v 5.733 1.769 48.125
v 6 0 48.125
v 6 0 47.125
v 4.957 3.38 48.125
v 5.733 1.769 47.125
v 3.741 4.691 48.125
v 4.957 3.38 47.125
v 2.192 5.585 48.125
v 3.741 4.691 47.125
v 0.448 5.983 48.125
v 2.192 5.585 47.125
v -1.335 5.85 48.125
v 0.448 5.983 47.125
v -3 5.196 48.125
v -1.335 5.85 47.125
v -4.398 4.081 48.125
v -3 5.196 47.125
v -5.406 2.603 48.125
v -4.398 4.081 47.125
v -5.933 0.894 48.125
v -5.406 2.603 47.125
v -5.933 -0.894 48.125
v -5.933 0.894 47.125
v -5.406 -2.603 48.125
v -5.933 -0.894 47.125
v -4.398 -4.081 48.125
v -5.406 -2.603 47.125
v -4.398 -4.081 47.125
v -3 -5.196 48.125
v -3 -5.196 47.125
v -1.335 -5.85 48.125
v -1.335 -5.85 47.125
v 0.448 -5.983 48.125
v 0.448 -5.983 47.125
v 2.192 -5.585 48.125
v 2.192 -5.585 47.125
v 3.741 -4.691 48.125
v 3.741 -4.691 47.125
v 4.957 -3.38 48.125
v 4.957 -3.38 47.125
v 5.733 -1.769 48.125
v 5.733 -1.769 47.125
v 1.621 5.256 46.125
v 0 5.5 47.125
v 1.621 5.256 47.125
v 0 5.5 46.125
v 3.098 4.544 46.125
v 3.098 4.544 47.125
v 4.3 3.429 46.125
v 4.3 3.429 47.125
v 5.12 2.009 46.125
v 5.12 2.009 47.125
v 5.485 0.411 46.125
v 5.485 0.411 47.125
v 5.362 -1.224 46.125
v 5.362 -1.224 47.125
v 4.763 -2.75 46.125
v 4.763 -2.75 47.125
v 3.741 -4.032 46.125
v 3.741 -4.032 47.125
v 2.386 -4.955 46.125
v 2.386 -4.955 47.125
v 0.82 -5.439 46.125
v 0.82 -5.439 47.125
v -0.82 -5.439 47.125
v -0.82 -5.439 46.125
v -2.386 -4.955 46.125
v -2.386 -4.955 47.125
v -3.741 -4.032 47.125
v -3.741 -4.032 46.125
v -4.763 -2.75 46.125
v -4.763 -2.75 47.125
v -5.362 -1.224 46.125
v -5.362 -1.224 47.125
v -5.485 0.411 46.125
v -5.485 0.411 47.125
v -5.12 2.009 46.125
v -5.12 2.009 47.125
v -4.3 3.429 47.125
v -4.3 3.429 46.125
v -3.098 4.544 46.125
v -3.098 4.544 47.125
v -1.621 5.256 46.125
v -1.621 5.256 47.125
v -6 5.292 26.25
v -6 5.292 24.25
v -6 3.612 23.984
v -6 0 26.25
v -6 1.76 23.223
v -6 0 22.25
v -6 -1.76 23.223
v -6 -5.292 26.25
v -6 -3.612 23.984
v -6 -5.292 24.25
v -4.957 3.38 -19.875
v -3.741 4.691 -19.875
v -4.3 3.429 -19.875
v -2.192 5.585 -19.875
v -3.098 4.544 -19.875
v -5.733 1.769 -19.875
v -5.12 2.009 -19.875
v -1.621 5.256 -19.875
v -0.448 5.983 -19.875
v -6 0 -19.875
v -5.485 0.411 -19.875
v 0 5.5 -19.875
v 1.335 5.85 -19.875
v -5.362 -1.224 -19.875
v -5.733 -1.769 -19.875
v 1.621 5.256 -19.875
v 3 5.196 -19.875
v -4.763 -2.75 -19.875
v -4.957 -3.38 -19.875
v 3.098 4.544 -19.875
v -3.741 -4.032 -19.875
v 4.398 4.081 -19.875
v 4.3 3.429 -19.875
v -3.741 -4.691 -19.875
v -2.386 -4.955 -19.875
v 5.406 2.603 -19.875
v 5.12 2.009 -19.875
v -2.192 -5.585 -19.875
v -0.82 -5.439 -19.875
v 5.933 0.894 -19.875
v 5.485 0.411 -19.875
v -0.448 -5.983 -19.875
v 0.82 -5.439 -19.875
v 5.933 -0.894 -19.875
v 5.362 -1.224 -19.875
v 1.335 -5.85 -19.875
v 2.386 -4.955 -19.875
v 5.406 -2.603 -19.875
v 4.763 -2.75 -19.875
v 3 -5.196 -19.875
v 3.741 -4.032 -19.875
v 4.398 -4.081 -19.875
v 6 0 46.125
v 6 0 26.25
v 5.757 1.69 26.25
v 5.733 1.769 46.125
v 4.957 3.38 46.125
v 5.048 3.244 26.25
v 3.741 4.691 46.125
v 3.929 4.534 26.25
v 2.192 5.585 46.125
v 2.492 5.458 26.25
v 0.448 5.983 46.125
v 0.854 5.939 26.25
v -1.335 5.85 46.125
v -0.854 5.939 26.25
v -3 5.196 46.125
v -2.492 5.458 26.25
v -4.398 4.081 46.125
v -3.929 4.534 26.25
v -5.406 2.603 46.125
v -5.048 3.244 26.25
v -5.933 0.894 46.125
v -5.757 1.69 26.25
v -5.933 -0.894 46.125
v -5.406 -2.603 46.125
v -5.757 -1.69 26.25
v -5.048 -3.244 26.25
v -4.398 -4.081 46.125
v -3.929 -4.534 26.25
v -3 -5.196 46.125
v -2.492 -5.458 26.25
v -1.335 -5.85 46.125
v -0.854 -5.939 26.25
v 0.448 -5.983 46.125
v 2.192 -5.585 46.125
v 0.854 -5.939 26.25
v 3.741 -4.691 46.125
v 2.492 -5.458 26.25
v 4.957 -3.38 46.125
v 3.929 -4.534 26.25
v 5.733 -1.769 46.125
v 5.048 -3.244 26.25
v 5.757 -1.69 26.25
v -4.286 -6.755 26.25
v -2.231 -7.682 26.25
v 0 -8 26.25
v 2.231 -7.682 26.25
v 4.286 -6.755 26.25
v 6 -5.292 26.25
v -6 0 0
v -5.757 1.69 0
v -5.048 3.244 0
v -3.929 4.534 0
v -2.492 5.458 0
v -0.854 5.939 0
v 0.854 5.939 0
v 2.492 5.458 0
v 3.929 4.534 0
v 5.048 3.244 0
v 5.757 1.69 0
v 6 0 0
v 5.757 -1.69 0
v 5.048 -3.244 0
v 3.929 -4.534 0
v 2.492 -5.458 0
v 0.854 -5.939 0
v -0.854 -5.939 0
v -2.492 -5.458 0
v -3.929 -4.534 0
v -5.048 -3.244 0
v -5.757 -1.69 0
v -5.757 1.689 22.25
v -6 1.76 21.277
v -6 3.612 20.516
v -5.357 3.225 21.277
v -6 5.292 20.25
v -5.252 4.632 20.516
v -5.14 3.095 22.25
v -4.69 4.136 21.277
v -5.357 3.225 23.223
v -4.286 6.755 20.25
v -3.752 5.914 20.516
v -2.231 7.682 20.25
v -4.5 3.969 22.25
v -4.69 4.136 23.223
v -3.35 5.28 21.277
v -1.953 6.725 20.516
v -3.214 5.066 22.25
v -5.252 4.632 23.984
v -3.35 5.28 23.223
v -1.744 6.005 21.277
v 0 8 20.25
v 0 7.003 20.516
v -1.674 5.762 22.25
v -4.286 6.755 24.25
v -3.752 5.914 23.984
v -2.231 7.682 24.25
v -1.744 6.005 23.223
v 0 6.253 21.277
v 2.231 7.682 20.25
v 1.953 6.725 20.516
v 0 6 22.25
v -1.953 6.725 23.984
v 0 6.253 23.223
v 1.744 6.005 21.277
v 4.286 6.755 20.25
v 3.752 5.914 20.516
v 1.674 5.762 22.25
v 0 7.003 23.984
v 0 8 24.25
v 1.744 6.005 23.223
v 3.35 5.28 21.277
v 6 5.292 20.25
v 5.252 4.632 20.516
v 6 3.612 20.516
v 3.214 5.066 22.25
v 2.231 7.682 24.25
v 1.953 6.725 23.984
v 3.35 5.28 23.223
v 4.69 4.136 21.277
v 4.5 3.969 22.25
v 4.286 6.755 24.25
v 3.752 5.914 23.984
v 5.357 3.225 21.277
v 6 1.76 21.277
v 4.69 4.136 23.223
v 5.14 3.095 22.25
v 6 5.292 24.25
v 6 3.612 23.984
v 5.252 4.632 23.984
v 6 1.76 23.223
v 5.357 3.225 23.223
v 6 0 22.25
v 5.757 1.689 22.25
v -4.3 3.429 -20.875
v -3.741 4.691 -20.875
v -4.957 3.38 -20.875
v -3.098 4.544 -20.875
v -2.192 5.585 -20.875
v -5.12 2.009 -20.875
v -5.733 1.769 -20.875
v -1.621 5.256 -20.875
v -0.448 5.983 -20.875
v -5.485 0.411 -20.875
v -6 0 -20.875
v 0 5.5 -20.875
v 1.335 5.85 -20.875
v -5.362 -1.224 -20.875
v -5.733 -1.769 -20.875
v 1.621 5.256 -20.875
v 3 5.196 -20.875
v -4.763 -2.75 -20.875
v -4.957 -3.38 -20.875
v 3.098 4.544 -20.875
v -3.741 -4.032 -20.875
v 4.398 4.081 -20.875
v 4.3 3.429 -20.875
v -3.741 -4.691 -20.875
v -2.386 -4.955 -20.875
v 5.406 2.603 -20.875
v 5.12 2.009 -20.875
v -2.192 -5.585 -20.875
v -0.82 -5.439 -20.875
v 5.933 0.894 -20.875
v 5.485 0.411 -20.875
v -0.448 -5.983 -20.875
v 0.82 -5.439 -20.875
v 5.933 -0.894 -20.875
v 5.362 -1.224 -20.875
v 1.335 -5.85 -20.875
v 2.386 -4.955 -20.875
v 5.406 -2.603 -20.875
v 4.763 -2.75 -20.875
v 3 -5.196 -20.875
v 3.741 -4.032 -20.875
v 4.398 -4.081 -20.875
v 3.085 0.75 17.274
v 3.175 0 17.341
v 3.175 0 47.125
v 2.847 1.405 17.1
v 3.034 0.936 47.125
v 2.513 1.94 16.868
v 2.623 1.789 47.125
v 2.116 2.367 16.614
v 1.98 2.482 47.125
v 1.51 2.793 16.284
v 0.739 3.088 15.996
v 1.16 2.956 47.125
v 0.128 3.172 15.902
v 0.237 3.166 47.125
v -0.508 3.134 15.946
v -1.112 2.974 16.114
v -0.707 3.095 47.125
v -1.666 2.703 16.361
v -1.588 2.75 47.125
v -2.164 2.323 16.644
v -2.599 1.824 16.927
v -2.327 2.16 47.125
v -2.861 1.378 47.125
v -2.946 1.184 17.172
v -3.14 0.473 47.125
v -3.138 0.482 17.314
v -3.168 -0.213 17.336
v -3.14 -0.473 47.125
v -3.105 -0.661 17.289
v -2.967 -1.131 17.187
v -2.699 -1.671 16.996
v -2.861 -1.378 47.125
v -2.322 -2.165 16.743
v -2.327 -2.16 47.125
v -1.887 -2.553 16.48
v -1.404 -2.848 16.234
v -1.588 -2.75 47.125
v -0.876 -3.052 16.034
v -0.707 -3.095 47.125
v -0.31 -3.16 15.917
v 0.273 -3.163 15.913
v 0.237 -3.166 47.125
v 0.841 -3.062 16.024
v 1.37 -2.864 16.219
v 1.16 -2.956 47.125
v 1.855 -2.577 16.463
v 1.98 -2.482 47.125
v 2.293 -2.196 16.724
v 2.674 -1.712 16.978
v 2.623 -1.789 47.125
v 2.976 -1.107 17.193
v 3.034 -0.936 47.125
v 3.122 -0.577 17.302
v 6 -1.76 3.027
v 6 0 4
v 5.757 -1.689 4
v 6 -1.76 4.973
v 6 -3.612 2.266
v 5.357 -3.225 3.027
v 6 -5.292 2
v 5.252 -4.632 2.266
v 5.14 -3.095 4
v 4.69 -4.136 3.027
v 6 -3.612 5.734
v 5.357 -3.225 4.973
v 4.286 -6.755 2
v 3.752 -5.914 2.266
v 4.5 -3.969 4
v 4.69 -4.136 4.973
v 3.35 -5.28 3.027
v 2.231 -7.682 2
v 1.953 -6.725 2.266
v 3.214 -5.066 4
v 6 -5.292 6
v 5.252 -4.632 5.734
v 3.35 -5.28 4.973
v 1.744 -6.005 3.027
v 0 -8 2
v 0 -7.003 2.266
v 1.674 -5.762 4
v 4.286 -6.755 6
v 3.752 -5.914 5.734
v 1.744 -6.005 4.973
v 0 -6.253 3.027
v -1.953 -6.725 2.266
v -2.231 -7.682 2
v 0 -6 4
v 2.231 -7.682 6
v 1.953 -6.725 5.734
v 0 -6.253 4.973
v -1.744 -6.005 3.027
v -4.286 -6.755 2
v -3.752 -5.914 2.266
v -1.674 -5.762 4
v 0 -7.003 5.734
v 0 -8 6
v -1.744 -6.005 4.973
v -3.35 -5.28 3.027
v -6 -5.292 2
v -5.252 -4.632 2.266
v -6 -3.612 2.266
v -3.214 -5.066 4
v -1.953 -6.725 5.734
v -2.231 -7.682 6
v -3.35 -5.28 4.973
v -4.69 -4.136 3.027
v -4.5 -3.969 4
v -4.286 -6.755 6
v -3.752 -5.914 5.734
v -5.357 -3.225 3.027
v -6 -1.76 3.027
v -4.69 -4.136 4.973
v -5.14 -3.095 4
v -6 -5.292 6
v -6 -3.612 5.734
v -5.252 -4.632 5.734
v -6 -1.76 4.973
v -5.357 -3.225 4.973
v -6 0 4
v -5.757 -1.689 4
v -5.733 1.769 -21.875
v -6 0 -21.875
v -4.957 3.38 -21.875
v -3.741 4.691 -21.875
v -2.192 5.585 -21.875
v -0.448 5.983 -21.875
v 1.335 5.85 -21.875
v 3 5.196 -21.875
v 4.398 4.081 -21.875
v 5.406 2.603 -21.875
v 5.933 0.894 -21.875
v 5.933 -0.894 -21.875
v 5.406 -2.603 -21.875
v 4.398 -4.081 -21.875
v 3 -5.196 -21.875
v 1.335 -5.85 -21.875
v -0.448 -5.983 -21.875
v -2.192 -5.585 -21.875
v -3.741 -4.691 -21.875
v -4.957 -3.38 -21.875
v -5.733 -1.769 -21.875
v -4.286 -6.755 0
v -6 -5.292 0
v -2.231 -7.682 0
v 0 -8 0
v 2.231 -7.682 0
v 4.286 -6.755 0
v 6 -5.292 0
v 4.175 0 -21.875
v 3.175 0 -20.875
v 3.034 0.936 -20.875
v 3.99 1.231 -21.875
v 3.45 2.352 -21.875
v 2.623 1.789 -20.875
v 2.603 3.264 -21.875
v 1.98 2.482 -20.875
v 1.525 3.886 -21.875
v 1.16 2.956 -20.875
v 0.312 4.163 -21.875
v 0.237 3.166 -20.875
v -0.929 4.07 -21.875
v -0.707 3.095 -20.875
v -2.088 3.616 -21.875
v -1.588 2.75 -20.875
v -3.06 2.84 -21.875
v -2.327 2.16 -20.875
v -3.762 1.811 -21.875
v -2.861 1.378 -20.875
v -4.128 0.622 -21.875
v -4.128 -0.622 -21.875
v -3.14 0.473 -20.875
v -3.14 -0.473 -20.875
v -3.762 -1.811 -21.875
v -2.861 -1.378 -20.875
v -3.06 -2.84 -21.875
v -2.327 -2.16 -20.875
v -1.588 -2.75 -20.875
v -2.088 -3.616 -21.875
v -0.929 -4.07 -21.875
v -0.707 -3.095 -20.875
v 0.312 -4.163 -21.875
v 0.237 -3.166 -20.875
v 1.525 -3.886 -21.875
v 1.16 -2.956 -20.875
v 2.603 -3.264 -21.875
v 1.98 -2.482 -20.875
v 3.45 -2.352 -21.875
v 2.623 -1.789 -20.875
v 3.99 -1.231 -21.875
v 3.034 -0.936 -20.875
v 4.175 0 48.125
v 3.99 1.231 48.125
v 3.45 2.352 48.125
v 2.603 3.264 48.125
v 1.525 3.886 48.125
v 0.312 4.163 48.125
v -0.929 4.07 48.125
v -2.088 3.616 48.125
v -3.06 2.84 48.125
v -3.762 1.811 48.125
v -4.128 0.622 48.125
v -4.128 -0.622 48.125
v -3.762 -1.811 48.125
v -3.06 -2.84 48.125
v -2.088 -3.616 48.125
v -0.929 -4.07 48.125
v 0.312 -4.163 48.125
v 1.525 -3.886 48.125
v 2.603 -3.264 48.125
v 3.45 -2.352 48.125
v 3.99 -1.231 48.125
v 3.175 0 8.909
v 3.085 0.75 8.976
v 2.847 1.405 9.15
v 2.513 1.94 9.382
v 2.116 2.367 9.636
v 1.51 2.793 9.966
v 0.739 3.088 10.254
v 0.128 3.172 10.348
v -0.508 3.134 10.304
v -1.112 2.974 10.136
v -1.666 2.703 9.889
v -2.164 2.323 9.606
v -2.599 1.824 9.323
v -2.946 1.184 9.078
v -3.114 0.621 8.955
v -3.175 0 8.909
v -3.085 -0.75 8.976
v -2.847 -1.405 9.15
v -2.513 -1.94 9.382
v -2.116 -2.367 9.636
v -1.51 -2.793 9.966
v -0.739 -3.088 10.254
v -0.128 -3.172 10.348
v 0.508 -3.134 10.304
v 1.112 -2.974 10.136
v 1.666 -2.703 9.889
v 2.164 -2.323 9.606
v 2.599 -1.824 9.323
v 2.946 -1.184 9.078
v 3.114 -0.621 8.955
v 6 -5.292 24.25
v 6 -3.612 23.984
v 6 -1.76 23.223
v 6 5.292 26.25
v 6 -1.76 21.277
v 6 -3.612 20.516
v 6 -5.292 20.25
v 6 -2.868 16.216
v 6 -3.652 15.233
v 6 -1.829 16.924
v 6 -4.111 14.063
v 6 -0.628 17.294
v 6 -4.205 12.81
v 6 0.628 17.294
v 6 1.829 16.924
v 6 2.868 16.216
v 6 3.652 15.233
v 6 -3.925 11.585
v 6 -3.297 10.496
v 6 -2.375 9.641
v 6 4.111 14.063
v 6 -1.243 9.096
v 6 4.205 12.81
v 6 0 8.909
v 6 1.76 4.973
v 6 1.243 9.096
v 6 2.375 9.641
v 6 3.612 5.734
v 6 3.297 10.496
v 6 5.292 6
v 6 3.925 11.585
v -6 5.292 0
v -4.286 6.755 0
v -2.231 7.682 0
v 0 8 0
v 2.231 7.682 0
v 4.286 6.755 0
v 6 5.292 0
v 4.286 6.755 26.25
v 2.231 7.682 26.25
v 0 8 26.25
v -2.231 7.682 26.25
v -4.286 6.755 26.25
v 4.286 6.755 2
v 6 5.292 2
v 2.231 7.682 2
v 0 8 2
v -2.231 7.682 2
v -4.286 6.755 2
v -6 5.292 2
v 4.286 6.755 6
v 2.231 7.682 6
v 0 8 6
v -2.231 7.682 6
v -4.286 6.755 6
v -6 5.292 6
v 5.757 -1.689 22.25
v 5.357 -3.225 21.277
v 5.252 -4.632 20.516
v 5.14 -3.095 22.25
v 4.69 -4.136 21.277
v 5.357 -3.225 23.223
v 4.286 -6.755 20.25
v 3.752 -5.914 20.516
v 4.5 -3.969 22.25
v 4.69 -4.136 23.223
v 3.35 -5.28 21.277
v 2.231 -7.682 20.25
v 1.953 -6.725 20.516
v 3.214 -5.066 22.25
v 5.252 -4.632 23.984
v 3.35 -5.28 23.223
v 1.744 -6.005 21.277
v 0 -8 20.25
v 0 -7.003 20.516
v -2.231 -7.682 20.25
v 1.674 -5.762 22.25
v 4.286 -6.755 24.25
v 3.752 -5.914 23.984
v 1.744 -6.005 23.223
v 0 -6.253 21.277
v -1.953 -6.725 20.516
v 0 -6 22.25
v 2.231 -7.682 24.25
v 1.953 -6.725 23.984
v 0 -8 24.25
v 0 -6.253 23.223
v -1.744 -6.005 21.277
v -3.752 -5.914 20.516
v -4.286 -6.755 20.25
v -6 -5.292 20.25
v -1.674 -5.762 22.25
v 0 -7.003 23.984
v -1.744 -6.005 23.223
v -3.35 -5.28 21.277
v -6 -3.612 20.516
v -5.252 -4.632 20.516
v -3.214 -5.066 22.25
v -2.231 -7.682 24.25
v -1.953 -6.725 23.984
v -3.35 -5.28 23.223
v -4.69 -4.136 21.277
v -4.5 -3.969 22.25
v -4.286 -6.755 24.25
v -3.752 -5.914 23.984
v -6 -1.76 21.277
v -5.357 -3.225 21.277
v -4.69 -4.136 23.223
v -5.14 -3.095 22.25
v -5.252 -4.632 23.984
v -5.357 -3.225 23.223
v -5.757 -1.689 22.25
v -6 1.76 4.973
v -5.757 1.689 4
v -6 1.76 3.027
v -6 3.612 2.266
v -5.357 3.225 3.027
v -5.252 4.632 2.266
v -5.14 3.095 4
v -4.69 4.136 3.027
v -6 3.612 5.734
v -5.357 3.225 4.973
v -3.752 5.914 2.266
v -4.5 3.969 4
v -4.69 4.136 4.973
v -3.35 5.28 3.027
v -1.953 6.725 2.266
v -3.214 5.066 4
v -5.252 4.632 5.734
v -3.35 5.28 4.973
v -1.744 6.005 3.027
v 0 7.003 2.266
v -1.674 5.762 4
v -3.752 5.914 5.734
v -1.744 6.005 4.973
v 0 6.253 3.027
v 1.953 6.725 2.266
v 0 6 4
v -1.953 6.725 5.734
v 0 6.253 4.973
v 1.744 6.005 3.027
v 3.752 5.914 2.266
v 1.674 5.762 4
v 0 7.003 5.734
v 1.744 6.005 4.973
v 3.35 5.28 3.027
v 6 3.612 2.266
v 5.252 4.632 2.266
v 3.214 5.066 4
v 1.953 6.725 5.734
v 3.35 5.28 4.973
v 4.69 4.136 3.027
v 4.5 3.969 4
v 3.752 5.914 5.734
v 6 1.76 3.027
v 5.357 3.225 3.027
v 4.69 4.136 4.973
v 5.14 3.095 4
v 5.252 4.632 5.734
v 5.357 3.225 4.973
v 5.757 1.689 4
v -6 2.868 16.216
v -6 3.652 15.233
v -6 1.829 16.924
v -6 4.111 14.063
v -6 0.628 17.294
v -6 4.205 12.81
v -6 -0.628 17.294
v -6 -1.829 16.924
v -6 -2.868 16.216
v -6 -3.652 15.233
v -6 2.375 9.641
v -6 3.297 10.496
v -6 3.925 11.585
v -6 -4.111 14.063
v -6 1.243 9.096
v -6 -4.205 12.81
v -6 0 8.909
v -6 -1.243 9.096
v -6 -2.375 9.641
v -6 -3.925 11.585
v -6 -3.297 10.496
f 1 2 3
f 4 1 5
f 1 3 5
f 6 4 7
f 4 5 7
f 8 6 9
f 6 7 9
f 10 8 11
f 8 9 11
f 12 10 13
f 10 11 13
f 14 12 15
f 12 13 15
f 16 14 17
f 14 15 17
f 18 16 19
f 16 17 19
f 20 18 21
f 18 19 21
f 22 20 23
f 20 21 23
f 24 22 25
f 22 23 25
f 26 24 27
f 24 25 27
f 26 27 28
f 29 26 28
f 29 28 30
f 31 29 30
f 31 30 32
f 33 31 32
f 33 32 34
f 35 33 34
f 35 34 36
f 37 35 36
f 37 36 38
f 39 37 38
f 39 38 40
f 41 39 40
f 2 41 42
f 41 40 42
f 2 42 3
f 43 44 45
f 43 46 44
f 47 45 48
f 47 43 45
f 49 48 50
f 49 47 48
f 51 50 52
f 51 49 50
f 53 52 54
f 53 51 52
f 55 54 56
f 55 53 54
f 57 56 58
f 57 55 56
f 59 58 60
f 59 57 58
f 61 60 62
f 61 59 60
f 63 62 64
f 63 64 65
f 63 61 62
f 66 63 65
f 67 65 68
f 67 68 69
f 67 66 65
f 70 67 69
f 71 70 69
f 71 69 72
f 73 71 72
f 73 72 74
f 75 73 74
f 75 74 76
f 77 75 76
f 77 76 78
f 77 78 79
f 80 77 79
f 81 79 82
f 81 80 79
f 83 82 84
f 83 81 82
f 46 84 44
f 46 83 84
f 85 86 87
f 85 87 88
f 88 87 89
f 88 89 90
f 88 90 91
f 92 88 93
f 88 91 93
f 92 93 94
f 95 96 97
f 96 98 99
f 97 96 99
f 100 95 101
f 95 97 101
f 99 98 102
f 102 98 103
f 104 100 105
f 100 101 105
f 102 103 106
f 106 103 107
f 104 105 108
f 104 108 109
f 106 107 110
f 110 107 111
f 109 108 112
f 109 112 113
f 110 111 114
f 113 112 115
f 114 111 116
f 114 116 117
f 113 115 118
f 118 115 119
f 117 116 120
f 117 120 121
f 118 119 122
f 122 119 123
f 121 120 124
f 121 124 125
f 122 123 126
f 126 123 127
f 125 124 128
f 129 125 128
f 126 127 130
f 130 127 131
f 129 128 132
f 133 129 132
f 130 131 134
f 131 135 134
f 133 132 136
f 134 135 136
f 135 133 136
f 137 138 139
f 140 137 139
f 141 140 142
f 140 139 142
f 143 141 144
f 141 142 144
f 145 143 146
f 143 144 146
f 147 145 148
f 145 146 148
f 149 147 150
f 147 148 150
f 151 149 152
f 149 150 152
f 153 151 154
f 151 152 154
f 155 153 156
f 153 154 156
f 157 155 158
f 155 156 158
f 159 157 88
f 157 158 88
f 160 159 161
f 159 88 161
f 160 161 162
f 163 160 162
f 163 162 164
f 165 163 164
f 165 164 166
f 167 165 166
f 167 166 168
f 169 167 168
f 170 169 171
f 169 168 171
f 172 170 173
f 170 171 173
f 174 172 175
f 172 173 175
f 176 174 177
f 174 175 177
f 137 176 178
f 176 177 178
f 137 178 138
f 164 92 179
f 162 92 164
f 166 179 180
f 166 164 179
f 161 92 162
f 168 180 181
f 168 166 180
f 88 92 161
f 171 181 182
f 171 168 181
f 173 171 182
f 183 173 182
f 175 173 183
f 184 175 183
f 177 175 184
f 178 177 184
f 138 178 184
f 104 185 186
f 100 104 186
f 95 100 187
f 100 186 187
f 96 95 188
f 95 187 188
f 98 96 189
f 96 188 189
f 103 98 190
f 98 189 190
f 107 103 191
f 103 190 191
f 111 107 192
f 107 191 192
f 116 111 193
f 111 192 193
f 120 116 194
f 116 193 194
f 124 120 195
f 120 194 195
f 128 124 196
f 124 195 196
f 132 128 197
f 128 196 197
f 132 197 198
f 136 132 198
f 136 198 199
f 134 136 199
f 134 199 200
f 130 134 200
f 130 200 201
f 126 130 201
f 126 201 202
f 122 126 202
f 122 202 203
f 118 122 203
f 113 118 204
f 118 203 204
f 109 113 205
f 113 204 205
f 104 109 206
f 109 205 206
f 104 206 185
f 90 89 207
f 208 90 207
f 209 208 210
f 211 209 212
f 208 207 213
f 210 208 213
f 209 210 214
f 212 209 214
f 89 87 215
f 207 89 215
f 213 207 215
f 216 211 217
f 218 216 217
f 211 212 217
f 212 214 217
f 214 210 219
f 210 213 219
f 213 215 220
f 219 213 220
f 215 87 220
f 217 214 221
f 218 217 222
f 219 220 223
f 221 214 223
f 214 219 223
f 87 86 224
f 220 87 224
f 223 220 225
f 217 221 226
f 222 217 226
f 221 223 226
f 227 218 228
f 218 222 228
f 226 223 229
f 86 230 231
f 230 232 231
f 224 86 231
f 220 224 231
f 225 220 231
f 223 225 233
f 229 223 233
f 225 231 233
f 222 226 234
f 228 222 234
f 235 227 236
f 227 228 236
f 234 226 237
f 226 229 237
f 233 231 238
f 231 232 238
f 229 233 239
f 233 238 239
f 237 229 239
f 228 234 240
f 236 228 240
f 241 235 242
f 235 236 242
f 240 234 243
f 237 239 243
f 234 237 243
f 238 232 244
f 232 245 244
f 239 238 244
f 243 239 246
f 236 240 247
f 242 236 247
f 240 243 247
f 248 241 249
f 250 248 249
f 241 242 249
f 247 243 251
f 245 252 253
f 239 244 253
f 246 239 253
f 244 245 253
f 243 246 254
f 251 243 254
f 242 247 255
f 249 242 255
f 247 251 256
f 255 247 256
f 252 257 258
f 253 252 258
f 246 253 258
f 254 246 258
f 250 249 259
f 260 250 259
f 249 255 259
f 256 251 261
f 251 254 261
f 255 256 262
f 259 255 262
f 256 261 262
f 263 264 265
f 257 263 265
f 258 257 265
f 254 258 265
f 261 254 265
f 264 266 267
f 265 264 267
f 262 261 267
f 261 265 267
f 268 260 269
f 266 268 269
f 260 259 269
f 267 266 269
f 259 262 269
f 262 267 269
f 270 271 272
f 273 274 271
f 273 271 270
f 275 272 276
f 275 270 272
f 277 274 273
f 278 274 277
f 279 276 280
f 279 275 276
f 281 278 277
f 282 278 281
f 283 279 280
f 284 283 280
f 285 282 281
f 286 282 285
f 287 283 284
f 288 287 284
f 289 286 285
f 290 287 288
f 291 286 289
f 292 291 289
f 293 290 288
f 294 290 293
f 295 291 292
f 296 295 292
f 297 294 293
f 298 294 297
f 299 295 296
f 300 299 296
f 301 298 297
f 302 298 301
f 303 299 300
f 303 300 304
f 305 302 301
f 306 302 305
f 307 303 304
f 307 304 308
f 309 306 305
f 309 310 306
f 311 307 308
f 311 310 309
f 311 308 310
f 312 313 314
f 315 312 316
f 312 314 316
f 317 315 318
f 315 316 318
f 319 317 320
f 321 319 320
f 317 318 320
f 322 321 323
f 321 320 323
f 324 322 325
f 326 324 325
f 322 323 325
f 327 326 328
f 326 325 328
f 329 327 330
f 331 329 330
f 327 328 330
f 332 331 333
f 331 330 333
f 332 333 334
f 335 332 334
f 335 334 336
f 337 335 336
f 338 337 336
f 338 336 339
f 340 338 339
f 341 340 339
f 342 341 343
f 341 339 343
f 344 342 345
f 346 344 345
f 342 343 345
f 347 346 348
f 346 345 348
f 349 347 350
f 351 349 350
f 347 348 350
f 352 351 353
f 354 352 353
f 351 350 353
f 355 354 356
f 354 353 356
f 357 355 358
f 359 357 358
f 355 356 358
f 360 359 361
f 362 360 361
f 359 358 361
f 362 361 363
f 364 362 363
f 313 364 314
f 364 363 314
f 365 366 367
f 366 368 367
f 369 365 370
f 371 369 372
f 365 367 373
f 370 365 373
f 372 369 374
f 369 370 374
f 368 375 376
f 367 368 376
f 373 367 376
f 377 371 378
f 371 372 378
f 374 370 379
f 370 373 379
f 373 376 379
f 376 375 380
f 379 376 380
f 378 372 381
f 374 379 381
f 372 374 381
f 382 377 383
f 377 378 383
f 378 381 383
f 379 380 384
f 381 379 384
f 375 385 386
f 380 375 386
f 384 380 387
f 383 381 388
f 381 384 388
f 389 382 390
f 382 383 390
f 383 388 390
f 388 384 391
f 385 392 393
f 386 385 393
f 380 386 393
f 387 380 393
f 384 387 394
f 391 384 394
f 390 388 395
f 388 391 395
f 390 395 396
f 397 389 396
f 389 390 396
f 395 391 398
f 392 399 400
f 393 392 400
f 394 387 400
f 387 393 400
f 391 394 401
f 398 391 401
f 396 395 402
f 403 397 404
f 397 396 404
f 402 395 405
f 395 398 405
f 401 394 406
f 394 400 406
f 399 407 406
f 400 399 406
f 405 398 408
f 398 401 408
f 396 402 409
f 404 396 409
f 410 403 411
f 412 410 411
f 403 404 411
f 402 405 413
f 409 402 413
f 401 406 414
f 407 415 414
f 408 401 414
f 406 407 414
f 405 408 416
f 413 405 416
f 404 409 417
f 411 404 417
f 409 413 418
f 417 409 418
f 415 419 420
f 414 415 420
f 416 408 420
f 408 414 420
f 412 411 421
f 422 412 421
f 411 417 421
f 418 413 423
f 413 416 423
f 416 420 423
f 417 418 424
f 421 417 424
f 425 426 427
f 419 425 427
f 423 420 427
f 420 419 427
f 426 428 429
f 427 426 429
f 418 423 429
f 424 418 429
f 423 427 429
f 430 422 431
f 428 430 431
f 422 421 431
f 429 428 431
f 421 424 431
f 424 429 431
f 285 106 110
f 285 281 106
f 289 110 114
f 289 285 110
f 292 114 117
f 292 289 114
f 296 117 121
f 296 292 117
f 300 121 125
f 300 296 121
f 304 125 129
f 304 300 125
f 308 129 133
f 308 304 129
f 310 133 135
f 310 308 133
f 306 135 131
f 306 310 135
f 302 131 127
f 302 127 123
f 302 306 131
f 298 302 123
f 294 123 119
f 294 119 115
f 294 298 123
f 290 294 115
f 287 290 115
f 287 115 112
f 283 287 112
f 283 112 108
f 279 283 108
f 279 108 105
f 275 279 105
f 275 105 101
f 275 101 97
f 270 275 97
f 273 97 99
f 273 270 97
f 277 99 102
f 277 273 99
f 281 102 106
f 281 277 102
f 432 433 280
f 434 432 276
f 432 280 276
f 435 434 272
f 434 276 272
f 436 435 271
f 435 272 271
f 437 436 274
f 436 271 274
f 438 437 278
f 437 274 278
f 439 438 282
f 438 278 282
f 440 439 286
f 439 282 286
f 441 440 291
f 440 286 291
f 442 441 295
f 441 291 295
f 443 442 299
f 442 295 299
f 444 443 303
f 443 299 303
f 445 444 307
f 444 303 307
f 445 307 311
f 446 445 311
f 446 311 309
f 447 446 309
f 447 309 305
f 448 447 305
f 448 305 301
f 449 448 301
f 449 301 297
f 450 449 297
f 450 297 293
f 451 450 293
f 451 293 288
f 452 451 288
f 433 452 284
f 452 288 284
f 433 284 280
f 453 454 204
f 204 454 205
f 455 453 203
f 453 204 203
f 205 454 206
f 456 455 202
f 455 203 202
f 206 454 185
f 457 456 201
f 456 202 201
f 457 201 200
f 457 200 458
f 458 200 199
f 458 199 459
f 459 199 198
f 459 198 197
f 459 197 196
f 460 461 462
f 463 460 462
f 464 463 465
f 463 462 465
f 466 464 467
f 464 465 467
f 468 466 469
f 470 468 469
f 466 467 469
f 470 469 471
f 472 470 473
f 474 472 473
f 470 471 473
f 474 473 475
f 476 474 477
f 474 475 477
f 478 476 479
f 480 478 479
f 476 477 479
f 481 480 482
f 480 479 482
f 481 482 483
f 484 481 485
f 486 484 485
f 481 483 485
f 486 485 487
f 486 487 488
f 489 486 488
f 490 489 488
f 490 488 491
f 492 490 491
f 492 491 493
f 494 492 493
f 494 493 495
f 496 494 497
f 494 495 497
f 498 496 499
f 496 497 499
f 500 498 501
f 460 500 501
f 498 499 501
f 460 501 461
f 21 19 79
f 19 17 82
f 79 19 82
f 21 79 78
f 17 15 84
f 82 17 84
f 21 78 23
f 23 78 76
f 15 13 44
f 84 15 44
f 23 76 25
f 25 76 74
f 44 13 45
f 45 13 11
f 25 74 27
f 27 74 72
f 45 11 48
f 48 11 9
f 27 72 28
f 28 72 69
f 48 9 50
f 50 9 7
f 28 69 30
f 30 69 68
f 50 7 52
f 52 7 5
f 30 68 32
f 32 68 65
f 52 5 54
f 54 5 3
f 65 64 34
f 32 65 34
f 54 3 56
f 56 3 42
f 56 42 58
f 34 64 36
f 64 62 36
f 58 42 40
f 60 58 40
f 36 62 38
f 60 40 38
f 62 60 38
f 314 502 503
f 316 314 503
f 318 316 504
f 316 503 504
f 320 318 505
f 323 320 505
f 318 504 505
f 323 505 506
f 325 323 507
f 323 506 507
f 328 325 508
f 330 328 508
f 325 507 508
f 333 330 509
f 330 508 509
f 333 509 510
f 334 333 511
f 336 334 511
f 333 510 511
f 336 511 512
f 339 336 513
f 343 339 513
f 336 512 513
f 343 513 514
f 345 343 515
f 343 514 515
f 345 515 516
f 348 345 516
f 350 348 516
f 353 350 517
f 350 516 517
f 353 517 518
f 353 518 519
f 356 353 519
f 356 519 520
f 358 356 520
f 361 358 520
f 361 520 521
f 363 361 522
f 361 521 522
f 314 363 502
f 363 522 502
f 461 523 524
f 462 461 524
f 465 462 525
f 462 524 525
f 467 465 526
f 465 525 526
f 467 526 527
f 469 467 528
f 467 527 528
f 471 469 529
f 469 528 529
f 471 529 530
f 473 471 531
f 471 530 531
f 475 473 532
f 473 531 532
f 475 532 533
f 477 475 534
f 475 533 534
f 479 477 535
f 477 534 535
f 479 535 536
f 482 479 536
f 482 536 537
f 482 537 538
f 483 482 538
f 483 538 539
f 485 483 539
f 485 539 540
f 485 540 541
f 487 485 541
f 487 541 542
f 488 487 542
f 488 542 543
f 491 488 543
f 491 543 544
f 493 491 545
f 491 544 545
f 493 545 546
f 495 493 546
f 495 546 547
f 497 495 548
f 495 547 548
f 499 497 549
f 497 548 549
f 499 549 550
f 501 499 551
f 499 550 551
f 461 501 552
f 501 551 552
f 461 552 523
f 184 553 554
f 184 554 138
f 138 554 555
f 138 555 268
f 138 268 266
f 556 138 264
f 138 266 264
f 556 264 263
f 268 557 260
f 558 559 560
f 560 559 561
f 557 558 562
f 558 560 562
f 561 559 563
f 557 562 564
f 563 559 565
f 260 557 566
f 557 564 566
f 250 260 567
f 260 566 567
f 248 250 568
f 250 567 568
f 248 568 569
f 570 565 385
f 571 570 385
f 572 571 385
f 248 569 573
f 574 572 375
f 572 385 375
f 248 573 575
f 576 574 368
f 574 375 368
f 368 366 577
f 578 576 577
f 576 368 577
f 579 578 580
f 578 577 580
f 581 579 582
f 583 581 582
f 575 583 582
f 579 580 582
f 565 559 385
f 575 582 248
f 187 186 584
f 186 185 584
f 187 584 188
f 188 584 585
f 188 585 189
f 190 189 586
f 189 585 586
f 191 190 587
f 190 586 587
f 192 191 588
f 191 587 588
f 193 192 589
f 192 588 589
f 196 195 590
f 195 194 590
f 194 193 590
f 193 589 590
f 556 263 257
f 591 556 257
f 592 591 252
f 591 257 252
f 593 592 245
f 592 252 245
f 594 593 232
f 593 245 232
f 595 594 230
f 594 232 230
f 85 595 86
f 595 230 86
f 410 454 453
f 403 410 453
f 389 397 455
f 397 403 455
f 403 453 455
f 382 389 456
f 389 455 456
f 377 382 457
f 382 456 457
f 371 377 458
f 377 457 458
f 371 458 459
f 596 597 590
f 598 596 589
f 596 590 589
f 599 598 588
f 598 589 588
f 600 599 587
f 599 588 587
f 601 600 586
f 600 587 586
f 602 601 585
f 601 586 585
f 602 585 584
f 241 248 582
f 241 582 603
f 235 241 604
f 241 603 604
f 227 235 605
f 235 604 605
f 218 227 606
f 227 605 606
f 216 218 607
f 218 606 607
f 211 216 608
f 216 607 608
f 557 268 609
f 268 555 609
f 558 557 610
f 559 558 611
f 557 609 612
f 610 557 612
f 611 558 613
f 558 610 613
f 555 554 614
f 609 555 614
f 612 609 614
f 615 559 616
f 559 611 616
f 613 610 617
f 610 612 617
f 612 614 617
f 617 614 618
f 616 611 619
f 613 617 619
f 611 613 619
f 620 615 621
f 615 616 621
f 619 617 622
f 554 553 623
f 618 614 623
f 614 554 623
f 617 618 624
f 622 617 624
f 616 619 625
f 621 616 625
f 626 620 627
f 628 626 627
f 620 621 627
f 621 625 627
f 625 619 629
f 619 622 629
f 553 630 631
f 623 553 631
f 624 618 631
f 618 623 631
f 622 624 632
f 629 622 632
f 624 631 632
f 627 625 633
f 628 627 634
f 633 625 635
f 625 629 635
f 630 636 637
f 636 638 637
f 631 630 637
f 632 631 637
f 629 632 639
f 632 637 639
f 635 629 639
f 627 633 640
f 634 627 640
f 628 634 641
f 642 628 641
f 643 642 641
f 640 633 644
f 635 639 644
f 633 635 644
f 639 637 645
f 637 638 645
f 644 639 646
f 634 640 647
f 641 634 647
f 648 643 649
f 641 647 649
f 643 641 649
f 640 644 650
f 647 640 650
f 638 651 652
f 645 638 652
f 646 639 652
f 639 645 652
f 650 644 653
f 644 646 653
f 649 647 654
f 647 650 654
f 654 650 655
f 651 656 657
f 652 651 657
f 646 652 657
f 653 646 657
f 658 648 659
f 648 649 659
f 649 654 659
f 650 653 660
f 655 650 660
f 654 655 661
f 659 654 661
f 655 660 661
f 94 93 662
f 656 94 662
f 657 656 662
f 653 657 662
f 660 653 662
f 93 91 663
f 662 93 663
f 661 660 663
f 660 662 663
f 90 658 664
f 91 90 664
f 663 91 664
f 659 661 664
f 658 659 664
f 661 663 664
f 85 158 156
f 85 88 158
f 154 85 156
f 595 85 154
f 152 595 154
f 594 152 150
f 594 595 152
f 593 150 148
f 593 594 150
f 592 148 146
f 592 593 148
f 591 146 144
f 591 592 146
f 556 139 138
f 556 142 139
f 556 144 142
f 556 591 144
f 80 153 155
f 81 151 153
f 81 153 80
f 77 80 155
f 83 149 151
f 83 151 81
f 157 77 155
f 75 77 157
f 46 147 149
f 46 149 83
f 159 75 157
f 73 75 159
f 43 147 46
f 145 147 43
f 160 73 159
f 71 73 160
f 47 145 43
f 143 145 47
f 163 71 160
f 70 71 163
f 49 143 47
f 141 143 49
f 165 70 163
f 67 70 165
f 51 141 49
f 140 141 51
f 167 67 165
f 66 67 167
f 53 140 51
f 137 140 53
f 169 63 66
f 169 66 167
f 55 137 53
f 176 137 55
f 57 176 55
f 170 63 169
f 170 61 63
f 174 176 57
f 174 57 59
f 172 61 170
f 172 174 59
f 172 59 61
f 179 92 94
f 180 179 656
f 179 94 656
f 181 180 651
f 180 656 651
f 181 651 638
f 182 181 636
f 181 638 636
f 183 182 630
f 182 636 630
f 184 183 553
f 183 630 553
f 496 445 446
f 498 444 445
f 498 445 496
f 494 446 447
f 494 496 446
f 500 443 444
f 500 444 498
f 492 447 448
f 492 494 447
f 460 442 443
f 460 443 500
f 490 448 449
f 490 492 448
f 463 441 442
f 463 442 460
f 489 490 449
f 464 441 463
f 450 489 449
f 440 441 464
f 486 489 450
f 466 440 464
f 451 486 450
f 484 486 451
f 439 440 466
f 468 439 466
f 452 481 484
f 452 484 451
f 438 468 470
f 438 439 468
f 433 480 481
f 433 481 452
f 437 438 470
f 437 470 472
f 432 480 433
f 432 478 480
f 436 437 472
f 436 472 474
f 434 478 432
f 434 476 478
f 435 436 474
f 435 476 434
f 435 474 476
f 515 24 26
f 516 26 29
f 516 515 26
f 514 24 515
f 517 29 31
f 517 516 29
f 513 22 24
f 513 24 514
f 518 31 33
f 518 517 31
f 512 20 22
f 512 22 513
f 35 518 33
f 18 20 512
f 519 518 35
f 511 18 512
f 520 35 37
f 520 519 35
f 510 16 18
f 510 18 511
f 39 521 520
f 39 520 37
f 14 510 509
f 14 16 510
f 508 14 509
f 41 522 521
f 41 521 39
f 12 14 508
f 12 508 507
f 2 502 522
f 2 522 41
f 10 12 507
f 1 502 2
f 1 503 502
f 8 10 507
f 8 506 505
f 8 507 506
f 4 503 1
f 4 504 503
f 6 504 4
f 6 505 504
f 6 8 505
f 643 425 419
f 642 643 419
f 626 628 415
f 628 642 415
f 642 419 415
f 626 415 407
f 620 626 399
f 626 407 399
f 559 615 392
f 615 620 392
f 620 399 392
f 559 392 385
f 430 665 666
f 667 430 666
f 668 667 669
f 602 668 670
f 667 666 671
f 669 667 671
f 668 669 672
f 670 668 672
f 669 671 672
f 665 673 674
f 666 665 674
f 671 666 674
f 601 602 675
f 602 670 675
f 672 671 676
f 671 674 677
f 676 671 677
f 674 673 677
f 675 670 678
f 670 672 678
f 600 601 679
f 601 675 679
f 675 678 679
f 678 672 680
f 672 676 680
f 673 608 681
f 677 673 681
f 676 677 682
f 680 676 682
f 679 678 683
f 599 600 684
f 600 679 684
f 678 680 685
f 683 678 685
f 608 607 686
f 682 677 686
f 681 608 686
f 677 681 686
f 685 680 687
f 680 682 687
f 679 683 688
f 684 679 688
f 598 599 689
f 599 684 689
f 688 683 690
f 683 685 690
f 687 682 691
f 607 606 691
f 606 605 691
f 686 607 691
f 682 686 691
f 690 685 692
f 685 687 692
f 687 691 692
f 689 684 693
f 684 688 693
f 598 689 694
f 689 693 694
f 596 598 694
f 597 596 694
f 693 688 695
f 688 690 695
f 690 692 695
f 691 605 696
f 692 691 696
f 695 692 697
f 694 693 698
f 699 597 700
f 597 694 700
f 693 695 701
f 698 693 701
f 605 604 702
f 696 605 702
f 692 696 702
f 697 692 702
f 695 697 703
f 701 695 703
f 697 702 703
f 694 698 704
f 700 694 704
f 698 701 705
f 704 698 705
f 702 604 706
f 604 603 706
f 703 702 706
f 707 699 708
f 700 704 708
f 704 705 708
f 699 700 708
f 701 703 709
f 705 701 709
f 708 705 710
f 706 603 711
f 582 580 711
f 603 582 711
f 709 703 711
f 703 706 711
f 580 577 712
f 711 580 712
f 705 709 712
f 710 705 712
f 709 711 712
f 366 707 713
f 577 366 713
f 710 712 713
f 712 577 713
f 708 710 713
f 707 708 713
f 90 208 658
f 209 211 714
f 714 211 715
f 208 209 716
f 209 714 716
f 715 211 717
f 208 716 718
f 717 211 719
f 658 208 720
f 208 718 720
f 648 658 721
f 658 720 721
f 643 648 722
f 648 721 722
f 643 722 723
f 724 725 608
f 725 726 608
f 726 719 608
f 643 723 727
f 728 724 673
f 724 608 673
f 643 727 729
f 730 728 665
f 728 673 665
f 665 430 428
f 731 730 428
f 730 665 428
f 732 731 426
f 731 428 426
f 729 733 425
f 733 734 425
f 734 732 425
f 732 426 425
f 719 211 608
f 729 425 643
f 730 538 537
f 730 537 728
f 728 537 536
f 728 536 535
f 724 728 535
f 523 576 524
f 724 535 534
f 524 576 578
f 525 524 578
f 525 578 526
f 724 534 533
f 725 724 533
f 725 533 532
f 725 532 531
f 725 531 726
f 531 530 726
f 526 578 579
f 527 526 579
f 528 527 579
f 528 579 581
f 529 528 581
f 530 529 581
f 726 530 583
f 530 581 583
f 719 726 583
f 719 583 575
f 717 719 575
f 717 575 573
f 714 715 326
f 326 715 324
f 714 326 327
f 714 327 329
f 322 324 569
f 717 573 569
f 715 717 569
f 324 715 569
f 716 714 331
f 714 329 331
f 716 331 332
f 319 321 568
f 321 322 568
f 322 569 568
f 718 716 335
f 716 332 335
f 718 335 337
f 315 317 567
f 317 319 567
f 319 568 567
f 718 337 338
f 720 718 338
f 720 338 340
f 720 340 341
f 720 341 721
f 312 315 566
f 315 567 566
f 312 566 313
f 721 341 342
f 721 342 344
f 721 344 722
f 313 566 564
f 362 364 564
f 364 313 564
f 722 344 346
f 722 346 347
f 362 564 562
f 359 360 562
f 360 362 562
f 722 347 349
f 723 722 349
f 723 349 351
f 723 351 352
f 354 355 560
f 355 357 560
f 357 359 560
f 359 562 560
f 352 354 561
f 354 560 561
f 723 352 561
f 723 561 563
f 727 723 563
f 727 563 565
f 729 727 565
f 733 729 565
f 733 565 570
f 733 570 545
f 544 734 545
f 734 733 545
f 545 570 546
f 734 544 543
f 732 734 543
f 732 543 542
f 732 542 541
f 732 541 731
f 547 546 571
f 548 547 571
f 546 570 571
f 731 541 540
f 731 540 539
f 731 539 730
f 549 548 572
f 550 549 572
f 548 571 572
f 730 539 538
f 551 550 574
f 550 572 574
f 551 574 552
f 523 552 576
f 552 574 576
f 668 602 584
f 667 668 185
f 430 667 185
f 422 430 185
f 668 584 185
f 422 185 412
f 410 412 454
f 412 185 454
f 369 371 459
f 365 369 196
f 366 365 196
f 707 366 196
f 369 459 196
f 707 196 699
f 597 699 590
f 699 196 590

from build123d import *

# Parameters (mm, degrees)
SKETCH1_R               = 8
BOSS_EXTRUDE1_DEPTH     = 26.25
SKETCH2_R               = 6
BOSS_EXTRUDE2_DEPTH     = 21.875
SKETCH3_R               = 6
BOSS_EXTRUDE3_DEPTH     = 21.875
CUT_EXTRUDE4_DEPTH      = 22.875
CUT_EXTRUDE4_DEPTH_BACK = 49.125
SKETCH7_W               = 1
SKETCH7_H               = 0.5
SKETCH9_R               = 3.175
CUT_EXTRUDE5_DEPTH      = 71
CHAMFER1_SIZE           = 1
F_3_8_24_TAPPED_HOLE1_D = 8.4328


with BuildPart() as part:
    # Sketch1 → Boss-Extrude1 (new body)
    with BuildSketch(Plane.XY):
        Circle(SKETCH1_R)
    extrude(amount=BOSS_EXTRUDE1_DEPTH)

    # Sketch2 → Boss-Extrude2 (add)
    with BuildSketch(Plane(origin=(0, 0, 0), x_dir=(-1, 0, 0), z_dir=(0, 0, -1))):
        Circle(SKETCH2_R)
    extrude(amount=BOSS_EXTRUDE2_DEPTH)

    # Sketch3 → Boss-Extrude3 (add)
    with BuildSketch(Plane.XY.offset(26.25)):
        Circle(SKETCH3_R)
    extrude(amount=BOSS_EXTRUDE3_DEPTH)

    # Sketch5 → Cut-Extrude4 (cut, two sides)
    with BuildSketch(Plane(origin=(0, 0, 0), x_dir=(-1, 0, 0), z_dir=(0, 0, -1))) as cut_extrude4_sk:
        with BuildLine():
            Line((-6, -5.291502622), (-6, 5.291502622))
            ThreePointArc((-6, 5.291502622), (-8, 0), (-6, -5.291502622))
        make_face()
        with BuildLine():
            ThreePointArc((8, 0), (7.483314774, 2.828427125), (6, 5.291502622))
            Line((6, 5.291502622), (6, -5.291502622))
            ThreePointArc((6, -5.291502622), (7.483314774, -2.828427125), (8, 0))
        make_face()
    extrude(amount=CUT_EXTRUDE4_DEPTH, mode=Mode.SUBTRACT)
    extrude(cut_extrude4_sk.sketch, amount=-CUT_EXTRUDE4_DEPTH_BACK, mode=Mode.SUBTRACT)

    # Sketch7 → Cut-Revolve1 (revolve, cut)
    with BuildSketch(Plane(origin=(0, 0, 0), x_dir=(0, 0, -1), z_dir=(1, 0, 0))):
        with Locations((20.375, 5.75)):
            Rectangle(SKETCH7_W, SKETCH7_H)
        with Locations((-46.625, 5.75)):
            Rectangle(SKETCH7_W, SKETCH7_H)
    revolve(axis=Axis((0, 0, 48.125), (0, 0, -1)), mode=Mode.SUBTRACT)

    # Sketch8 → Cut-Revolve2 (revolve, cut)
    with BuildSketch(Plane(origin=(0, 0, 0), x_dir=(0, 0, -1), z_dir=(1, 0, 0))):
        with BuildLine():
            Line((-24.25, 8), (-20.25, 8))
            ThreePointArc((-20.25, 8), (-22.25, 6), (-24.25, 8))
        make_face()
        with BuildLine():
            Line((-6, 8), (-2, 8))
            ThreePointArc((-2, 8), (-4, 6), (-6, 8))
        make_face()
    revolve(axis=Axis((0, 0, 48.125), (0, 0, -1)), mode=Mode.SUBTRACT)

    # Sketch9 → Cut-Extrude5 (cut, through all)
    with BuildSketch(Plane.XY.offset(48.125)):
        Circle(SKETCH9_R)
    extrude(amount=-CUT_EXTRUDE5_DEPTH, mode=Mode.SUBTRACT)

    # Chamfer1
    chamfer1_edges = [part.edges().sort_by_distance(p)[0] for p in [
        (-3.175, 0, -21.875),
        (-3.175, 0, 48.125),
    ]]
    chamfer(chamfer1_edges, length=CHAMFER1_SIZE)

    # 3/8-24 Tapped Hole1 (through all)
    with Locations(Plane.ZY.offset(6)):
        with Locations((13.125, 0)):
            Hole(F_3_8_24_TAPPED_HOLE1_D / 2)


solid = part.part
